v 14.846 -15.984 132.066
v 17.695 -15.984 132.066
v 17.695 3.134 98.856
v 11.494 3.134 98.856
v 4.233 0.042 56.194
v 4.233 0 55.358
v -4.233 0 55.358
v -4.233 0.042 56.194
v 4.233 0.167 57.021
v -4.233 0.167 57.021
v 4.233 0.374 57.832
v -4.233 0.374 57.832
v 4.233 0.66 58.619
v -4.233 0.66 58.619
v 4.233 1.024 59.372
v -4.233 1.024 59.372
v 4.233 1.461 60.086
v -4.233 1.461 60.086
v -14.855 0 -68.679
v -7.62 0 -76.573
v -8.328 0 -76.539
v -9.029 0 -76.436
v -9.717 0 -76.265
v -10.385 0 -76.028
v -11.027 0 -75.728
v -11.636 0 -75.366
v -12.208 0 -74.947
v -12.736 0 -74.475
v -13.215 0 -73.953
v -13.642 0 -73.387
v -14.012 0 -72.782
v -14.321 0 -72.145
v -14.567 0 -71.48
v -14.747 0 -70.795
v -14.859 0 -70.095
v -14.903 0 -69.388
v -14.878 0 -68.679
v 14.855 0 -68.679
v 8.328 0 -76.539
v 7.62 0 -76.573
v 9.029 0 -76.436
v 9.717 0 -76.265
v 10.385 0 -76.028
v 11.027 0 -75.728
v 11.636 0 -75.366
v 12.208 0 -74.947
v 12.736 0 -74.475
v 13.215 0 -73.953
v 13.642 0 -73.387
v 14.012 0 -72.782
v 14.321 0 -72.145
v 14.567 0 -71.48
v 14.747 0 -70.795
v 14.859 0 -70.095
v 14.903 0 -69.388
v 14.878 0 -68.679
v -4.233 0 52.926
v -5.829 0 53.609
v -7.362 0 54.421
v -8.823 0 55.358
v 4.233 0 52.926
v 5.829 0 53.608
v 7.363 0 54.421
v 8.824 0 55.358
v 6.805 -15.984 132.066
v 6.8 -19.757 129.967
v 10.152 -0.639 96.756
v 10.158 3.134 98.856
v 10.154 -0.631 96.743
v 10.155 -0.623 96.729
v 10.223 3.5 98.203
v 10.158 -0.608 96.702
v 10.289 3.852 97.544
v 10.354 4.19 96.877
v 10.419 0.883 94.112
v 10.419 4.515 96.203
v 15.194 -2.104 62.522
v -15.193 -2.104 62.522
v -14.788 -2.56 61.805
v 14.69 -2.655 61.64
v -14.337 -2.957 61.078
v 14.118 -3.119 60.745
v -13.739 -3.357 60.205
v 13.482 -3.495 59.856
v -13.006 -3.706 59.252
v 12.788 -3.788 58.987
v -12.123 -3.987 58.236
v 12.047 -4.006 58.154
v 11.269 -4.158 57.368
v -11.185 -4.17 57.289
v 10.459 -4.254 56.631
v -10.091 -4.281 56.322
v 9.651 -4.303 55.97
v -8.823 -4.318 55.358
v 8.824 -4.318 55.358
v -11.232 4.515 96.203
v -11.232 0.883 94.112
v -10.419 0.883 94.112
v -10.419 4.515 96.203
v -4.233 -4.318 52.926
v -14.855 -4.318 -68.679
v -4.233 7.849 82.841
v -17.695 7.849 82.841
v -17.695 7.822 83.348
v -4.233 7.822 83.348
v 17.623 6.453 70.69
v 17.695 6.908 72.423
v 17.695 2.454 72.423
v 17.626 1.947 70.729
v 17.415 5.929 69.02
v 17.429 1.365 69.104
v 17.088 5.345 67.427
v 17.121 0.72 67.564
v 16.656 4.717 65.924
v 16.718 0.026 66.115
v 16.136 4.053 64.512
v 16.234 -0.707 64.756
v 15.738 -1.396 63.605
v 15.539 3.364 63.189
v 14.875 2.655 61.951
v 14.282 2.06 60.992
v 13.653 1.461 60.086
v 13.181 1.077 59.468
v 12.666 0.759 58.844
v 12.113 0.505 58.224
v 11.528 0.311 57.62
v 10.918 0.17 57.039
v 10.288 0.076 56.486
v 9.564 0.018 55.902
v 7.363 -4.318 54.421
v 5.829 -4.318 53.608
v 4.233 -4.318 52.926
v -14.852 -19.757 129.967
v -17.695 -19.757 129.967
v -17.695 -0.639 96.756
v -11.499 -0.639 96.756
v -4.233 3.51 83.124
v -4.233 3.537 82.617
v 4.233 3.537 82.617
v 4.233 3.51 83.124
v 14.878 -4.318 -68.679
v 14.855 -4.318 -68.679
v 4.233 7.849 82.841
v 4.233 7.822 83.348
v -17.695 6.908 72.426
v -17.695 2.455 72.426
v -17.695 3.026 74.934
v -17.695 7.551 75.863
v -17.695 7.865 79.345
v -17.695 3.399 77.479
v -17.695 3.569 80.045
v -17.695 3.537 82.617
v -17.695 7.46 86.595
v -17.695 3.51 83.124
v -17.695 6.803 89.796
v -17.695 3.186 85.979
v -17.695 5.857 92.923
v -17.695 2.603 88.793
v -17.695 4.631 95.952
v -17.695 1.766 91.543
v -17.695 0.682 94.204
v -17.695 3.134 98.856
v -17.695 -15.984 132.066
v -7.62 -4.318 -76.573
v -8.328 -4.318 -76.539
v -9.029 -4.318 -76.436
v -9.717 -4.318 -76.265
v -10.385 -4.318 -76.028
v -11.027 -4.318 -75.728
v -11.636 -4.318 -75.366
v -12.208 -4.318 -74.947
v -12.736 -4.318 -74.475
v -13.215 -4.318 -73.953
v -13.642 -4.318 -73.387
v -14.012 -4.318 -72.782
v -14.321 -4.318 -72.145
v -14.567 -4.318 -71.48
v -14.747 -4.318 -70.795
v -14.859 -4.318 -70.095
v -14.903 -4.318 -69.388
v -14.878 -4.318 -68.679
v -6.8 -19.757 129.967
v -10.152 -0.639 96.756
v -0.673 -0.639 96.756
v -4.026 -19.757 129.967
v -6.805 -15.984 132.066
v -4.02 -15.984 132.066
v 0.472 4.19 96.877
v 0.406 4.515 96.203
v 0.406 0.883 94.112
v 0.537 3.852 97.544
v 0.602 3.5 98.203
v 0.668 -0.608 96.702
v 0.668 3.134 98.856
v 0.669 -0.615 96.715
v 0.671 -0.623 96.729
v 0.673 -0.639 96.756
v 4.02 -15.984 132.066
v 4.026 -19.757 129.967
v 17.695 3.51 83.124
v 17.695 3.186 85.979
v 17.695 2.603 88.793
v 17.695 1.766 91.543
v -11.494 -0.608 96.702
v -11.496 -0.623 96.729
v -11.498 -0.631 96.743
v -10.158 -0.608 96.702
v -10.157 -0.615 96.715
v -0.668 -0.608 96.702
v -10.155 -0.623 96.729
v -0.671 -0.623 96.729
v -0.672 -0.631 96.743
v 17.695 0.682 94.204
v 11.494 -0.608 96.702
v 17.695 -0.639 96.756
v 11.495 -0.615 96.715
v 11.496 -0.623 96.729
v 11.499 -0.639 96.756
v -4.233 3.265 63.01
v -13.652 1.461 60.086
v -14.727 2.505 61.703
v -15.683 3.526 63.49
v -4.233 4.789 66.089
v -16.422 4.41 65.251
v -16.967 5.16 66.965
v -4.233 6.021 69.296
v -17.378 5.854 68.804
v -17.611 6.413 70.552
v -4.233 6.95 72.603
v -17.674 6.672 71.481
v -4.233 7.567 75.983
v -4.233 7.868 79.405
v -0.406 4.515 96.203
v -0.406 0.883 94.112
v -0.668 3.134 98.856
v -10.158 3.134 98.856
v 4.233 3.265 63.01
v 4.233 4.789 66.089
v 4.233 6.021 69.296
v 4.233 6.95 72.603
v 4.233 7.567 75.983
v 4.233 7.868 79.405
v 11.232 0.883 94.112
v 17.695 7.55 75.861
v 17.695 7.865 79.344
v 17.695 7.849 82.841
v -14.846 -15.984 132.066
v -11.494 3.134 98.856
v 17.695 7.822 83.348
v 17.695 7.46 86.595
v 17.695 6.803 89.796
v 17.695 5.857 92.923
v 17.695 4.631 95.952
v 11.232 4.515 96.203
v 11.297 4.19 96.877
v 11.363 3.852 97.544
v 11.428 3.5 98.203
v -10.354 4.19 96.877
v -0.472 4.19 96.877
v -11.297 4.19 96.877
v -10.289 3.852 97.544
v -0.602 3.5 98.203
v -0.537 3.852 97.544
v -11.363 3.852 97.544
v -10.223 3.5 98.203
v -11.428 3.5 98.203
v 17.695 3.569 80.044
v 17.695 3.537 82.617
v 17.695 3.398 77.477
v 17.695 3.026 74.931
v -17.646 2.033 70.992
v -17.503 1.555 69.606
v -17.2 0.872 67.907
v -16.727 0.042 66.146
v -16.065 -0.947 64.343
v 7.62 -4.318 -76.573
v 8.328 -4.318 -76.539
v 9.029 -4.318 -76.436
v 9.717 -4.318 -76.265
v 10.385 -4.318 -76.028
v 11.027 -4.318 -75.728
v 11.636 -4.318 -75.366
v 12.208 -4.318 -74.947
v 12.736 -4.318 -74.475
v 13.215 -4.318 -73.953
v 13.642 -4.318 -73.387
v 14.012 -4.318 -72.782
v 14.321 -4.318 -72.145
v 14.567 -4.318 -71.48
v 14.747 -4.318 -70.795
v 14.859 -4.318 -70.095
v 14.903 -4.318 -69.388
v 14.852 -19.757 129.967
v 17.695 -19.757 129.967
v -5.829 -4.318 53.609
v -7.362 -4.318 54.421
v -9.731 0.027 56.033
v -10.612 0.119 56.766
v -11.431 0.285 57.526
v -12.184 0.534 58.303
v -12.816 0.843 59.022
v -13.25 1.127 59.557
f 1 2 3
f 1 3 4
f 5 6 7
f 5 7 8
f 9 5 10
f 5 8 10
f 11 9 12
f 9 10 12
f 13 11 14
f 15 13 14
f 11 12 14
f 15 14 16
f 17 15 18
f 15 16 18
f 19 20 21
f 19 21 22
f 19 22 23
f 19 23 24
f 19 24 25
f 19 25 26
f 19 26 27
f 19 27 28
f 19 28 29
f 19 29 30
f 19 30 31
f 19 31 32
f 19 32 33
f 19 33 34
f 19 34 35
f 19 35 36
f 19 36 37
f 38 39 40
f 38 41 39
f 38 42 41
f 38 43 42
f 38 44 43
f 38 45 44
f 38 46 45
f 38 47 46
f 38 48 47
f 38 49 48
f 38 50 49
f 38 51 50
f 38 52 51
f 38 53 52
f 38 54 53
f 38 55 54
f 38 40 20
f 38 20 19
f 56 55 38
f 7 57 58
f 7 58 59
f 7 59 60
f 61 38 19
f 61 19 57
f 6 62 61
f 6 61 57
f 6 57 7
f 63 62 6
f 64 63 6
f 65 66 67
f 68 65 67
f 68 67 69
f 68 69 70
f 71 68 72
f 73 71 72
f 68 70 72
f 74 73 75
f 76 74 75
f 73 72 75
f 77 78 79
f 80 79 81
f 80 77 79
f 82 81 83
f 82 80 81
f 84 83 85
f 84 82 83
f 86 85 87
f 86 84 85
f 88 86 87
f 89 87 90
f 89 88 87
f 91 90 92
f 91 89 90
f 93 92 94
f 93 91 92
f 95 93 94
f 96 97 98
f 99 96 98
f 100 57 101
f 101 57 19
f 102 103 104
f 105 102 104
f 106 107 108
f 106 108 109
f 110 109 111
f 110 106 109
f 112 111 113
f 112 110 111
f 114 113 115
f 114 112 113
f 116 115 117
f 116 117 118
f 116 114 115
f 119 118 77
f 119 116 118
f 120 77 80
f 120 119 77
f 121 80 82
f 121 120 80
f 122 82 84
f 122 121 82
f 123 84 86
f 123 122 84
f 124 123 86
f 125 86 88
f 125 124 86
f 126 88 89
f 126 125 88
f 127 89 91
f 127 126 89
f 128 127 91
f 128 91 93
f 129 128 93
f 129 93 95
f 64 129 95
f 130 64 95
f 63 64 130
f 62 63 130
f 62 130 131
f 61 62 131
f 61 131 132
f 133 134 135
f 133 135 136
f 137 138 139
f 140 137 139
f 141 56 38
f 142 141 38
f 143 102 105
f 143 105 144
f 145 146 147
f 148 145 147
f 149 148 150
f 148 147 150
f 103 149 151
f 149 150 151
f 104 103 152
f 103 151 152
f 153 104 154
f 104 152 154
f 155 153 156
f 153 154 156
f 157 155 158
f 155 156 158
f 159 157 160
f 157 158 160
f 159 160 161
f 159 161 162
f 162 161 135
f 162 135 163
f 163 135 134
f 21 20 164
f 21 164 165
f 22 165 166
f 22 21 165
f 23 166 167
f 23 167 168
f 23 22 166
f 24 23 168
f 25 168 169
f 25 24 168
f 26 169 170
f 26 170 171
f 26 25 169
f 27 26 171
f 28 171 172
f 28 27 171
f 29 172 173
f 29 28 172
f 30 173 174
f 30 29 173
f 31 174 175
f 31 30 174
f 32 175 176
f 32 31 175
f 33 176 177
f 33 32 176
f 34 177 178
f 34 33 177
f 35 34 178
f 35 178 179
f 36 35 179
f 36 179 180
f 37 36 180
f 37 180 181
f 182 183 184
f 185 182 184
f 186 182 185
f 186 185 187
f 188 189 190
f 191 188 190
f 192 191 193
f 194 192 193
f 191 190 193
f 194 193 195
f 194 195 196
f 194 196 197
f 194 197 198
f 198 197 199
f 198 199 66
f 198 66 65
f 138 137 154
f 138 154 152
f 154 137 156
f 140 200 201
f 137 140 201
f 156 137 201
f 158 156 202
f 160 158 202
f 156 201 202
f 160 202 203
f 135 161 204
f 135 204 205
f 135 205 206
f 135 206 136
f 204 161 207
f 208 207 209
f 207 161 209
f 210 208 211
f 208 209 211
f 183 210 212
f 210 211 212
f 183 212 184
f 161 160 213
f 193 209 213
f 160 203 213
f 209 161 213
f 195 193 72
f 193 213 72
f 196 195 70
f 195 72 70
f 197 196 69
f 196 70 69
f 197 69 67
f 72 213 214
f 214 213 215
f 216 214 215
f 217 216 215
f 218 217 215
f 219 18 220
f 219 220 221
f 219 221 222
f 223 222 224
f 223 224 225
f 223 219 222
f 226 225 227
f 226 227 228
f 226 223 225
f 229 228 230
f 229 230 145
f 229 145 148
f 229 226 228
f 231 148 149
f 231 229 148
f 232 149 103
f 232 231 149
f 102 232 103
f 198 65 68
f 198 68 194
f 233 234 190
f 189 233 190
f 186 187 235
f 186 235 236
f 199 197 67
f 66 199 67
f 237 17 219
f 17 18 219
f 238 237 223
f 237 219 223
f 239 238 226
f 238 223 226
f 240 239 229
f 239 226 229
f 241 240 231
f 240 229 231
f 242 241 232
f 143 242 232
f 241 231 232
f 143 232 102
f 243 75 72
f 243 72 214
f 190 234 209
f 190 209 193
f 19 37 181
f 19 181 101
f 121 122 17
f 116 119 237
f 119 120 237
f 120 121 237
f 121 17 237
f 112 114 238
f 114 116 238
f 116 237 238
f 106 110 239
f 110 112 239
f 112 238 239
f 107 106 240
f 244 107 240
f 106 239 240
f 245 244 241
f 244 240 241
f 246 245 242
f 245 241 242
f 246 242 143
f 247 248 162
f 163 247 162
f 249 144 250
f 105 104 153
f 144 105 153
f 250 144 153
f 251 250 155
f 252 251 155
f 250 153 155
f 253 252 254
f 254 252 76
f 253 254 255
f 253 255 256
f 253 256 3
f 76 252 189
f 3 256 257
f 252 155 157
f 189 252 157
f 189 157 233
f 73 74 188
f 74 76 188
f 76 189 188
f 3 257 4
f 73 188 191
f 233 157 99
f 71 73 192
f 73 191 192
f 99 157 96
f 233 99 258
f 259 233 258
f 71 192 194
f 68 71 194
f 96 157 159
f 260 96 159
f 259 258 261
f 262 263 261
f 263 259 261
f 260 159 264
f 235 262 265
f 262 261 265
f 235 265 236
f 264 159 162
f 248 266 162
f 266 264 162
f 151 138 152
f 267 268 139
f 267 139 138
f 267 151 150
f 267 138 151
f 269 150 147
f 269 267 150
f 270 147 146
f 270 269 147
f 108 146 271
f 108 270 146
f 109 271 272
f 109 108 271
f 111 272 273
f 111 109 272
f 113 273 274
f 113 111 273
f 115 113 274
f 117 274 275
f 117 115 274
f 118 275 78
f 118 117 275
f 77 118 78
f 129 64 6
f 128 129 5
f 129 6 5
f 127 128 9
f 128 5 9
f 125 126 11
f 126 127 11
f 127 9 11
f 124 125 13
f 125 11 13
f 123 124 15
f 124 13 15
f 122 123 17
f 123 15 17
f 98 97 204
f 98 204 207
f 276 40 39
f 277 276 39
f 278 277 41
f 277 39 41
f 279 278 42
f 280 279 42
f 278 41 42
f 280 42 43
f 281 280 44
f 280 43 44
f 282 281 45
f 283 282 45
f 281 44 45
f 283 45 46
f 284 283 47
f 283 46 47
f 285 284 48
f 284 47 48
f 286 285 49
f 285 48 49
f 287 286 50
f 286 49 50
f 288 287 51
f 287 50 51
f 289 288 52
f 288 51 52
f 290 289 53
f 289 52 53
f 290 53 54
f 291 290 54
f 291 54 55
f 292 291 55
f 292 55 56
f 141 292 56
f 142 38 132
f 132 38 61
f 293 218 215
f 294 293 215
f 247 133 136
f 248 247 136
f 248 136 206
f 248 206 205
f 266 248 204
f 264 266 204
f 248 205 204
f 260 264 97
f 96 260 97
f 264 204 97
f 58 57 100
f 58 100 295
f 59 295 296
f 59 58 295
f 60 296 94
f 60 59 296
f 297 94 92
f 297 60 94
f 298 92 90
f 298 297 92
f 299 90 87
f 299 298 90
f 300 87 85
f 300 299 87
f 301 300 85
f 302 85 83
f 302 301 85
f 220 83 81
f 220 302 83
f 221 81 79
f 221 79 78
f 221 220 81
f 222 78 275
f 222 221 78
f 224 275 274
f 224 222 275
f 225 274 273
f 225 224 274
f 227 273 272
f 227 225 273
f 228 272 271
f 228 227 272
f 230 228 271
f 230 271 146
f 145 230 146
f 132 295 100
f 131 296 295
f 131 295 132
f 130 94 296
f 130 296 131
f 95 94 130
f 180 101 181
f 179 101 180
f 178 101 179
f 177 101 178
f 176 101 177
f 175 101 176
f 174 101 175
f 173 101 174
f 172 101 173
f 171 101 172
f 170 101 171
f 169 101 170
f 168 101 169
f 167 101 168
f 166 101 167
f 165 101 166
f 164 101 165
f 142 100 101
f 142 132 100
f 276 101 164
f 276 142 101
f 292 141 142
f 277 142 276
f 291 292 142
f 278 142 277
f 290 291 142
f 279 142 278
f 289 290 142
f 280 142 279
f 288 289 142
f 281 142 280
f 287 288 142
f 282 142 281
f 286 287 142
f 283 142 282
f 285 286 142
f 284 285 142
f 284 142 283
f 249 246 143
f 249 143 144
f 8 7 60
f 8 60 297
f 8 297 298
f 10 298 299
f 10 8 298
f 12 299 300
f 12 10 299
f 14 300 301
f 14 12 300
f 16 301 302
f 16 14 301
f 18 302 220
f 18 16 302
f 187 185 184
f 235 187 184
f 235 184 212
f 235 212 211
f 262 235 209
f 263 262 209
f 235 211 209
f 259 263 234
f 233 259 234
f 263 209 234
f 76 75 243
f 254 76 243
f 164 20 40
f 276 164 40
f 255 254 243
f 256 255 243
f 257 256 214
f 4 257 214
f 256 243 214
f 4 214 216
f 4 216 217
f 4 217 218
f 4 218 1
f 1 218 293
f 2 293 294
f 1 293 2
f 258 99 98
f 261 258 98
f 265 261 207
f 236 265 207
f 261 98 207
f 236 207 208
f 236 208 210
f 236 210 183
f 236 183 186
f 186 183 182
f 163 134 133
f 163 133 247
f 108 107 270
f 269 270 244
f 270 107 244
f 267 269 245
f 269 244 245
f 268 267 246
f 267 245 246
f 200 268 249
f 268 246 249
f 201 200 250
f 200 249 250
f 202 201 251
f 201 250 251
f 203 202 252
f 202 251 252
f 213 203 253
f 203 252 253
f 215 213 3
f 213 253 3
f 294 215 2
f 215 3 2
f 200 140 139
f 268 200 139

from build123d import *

# Parameters (mm, degrees)
F1_DEPTH     = 4.318
F1_FACE_W    = 8.4660017827
F1_FACE_H    = 4.318
F4_W         = 8.4660017827
F4_H         = 4.318
F5_DEPTH     = 0.508
F7_DEPTH     = 13.462
F9_T1_DEPTH  = 101.8009504956
F10_T1_DEPTH = 101.8156278686
F8_FACE_W    = 35.3900017827
F8_FACE_H    = 4.318
F14_DEPTH    = 45.466


# Not quite as in the source:
# - a fillet or chamfer that OpenCascade refuses, or shapes differently, is made with other operations: its cross-section is extruded or revolved along the edge and cut away or added


with BuildPart() as f1:
    # F0 (on Front) → F1 (new body)
    with BuildSketch(Plane.XZ):
        with BuildLine():
            ThreePointArc((-14.8547158409, -68.6793103814), (-12.973951869, -74.217922925), (-7.62, -76.5734910965))
            Line((-7.62, -76.5734910965), (7.62, -76.5734910965))
            ThreePointArc((7.62, -76.5734910965), (12.9819628095, -74.2196084737), (14.8784083325, -68.6793103814))
            Line((14.8784083325, -68.6793103814), (14.8547158409, -68.6793103814))
            Line((14.8547158409, -68.6793103814), (-14.8547158409, -68.6793103814))
        make_face()
        Polygon((-7.1831139455, 19.1512540919), (-14.8547158409, -68.6793103814), (14.8547158409, -68.6793103814), (7.1831139455, 19.1512540919), (4.2330008913, 52.9264810056), (-4.2330008913, 52.9264810056), align=None)
    extrude(amount=F1_DEPTH)

    # F3: sweep along a path in F2
    with BuildLine(Plane.YZ) as f3_path:
        Line((-4.318, 52.9264810056), (-4.318, 55.3578620488))
        ThreePointArc((-4.318, 55.3578620488), (-3.7519884271, 59.1070386053), (-2.1044055351, 62.5220297571))
        ThreePointArc((-2.1044055351, 62.5220297571), (2.3667917296, 72.1058812805), (3.5367051605, 82.6165005565))
    # F1_face (on face) → F3 (sweep)
    with BuildSketch(Plane(origin=(0, -2.159, 52.9264810056), x_dir=(1, 0, 0), z_dir=(0, 0, 1))):
        Rectangle(F1_FACE_W, F1_FACE_H)
    sweep(path=f3_path.line)

    # F4 (on face) → F5 (join)
    with BuildSketch(Plane(origin=(0, -4.2773000259, 82.2099457989), x_dir=(1, 0, 0), z_dir=(0, -0.0519587059, 0.9986492342))):
        with Locations((0, 9.9835743541)):
            Rectangle(F4_W, F4_H)
    extrude(amount=F5_DEPTH)

    # F6 (on face) → F7 (join)
    with BuildSketch(Plane.YZ.offset(4.2330008913)):
        with BuildLine():
            Line((-4.318, 52.9264810056), (0, 52.9264810056))
            Line((0, 52.9264810056), (0, 55.3578620488))
            ThreePointArc((0, 55.3578620488), (0.3735676381, 57.8323185761), (1.4609723468, 60.0862127363))
            ThreePointArc((1.4609723468, 60.0862127363), (6.5240819847, 70.938807275), (7.8488725536, 82.8408582485))
            Line((7.8488725536, 82.8408582485), (7.822477531, 83.3481720595))
            Line((7.822477531, 83.3481720595), (3.5103101379, 83.1238143674))
            Line((3.5103101379, 83.1238143674), (3.5367051605, 82.6165005565))
            ThreePointArc((3.5367051605, 82.6165005565), (2.3667917296, 72.1058812805), (-2.1044055351, 62.5220297571))
            ThreePointArc((-2.1044055351, 62.5220297571), (-3.7519884271, 59.1070386053), (-4.318, 55.3578620488))
            Line((-4.318, 55.3578620488), (-4.318, 52.9264810056))
        make_face()
    extrude(amount=F7_DEPTH)

    # F8: F1 across plane


with BuildPart() as f1_1:
    add(f1.part)
    add(f1.part.mirror(Plane.YZ))

    # F9: fillet of radius 20.8491483247 on 1 edges, made by hand

    # F9_s2 → F9_t1 (cut)
    with BuildSketch(Plane.XZ.offset(-48.7414752478)):
        with BuildLine():
            ThreePointArc((17.6950008913, 72.4230711047), (14.0025238199, 60.5767376056), (4.2330008913, 52.9264810056))
            Line((4.2330008913, 52.9264810056), (17.6950008913, 52.9264810056))
            Line((17.6950008913, 52.9264810056), (17.6950008913, 72.4230711047))
        make_face()
    extrude(amount=F9_T1_DEPTH, mode=Mode.SUBTRACT)

    # F10: fillet of radius 20.8534 on 1 edges, made by hand

    # F10_s2 → F10_t1 (cut)
    with BuildSketch(Plane.XZ.offset(-48.7488139343)):
        with BuildLine():
            ThreePointArc((-4.2330008913, 52.9264810056), (-14.0026048293, 60.5784652564), (-17.6950008913, 72.4260065793))
            Line((-17.6950008913, 72.4260065793), (-17.6950008913, 52.9264810056))
            Line((-17.6950008913, 52.9264810056), (-4.2330008913, 52.9264810056))
        make_face()
    extrude(amount=F10_T1_DEPTH, mode=Mode.SUBTRACT)

    # F12: sweep along a path in F11
    with BuildLine(Plane.YZ) as f12_path:
        ThreePointArc((5.6663938345, 83.2359932134), (4.2906494395, 90.7738508992), (1.2476332355, 97.8060641719))
        Line((1.2476332355, 97.8060641719), (-17.8702931298, 131.016411811))
    # F8_face (on face) → F12 (sweep)
    with BuildSketch(Plane(origin=(0, 5.6663938345, 83.2359932134), x_dir=(1, 0, 0), z_dir=(0, -0.0519587059, 0.9986492342))):
        Rectangle(F8_FACE_W, F8_FACE_H)
    sweep(path=f12_path.line)

    # F13 (on face) → F14 (cut)
    with BuildSketch(Plane(origin=(0, 41.3553334691, 23.8066830455), x_dir=(1, 0, 0), z_dir=(0, -0.8666583712, -0.4989020622))):
        Polygon((-6.7998209327, 122.4935306315), (-14.8516167313, 122.4935306315), (-11.232118832, 81.1224803329), (-10.419318832, 81.1224803329), align=None)
        Polygon((4.0258978993, 122.4935306315), (-4.0258978993, 122.4935306315), (-0.4064, 81.1224803329), (0, 81.1224803329), (0.4064, 81.1224803329), align=None)
        Polygon((11.232118832, 81.1224803329), (14.8516167313, 122.4935306315), (6.7998209327, 122.4935306315), (10.419318832, 81.1224803329), align=None)
    extrude(amount=-F14_DEPTH, mode=Mode.SUBTRACT)


solid = f1_1.part
